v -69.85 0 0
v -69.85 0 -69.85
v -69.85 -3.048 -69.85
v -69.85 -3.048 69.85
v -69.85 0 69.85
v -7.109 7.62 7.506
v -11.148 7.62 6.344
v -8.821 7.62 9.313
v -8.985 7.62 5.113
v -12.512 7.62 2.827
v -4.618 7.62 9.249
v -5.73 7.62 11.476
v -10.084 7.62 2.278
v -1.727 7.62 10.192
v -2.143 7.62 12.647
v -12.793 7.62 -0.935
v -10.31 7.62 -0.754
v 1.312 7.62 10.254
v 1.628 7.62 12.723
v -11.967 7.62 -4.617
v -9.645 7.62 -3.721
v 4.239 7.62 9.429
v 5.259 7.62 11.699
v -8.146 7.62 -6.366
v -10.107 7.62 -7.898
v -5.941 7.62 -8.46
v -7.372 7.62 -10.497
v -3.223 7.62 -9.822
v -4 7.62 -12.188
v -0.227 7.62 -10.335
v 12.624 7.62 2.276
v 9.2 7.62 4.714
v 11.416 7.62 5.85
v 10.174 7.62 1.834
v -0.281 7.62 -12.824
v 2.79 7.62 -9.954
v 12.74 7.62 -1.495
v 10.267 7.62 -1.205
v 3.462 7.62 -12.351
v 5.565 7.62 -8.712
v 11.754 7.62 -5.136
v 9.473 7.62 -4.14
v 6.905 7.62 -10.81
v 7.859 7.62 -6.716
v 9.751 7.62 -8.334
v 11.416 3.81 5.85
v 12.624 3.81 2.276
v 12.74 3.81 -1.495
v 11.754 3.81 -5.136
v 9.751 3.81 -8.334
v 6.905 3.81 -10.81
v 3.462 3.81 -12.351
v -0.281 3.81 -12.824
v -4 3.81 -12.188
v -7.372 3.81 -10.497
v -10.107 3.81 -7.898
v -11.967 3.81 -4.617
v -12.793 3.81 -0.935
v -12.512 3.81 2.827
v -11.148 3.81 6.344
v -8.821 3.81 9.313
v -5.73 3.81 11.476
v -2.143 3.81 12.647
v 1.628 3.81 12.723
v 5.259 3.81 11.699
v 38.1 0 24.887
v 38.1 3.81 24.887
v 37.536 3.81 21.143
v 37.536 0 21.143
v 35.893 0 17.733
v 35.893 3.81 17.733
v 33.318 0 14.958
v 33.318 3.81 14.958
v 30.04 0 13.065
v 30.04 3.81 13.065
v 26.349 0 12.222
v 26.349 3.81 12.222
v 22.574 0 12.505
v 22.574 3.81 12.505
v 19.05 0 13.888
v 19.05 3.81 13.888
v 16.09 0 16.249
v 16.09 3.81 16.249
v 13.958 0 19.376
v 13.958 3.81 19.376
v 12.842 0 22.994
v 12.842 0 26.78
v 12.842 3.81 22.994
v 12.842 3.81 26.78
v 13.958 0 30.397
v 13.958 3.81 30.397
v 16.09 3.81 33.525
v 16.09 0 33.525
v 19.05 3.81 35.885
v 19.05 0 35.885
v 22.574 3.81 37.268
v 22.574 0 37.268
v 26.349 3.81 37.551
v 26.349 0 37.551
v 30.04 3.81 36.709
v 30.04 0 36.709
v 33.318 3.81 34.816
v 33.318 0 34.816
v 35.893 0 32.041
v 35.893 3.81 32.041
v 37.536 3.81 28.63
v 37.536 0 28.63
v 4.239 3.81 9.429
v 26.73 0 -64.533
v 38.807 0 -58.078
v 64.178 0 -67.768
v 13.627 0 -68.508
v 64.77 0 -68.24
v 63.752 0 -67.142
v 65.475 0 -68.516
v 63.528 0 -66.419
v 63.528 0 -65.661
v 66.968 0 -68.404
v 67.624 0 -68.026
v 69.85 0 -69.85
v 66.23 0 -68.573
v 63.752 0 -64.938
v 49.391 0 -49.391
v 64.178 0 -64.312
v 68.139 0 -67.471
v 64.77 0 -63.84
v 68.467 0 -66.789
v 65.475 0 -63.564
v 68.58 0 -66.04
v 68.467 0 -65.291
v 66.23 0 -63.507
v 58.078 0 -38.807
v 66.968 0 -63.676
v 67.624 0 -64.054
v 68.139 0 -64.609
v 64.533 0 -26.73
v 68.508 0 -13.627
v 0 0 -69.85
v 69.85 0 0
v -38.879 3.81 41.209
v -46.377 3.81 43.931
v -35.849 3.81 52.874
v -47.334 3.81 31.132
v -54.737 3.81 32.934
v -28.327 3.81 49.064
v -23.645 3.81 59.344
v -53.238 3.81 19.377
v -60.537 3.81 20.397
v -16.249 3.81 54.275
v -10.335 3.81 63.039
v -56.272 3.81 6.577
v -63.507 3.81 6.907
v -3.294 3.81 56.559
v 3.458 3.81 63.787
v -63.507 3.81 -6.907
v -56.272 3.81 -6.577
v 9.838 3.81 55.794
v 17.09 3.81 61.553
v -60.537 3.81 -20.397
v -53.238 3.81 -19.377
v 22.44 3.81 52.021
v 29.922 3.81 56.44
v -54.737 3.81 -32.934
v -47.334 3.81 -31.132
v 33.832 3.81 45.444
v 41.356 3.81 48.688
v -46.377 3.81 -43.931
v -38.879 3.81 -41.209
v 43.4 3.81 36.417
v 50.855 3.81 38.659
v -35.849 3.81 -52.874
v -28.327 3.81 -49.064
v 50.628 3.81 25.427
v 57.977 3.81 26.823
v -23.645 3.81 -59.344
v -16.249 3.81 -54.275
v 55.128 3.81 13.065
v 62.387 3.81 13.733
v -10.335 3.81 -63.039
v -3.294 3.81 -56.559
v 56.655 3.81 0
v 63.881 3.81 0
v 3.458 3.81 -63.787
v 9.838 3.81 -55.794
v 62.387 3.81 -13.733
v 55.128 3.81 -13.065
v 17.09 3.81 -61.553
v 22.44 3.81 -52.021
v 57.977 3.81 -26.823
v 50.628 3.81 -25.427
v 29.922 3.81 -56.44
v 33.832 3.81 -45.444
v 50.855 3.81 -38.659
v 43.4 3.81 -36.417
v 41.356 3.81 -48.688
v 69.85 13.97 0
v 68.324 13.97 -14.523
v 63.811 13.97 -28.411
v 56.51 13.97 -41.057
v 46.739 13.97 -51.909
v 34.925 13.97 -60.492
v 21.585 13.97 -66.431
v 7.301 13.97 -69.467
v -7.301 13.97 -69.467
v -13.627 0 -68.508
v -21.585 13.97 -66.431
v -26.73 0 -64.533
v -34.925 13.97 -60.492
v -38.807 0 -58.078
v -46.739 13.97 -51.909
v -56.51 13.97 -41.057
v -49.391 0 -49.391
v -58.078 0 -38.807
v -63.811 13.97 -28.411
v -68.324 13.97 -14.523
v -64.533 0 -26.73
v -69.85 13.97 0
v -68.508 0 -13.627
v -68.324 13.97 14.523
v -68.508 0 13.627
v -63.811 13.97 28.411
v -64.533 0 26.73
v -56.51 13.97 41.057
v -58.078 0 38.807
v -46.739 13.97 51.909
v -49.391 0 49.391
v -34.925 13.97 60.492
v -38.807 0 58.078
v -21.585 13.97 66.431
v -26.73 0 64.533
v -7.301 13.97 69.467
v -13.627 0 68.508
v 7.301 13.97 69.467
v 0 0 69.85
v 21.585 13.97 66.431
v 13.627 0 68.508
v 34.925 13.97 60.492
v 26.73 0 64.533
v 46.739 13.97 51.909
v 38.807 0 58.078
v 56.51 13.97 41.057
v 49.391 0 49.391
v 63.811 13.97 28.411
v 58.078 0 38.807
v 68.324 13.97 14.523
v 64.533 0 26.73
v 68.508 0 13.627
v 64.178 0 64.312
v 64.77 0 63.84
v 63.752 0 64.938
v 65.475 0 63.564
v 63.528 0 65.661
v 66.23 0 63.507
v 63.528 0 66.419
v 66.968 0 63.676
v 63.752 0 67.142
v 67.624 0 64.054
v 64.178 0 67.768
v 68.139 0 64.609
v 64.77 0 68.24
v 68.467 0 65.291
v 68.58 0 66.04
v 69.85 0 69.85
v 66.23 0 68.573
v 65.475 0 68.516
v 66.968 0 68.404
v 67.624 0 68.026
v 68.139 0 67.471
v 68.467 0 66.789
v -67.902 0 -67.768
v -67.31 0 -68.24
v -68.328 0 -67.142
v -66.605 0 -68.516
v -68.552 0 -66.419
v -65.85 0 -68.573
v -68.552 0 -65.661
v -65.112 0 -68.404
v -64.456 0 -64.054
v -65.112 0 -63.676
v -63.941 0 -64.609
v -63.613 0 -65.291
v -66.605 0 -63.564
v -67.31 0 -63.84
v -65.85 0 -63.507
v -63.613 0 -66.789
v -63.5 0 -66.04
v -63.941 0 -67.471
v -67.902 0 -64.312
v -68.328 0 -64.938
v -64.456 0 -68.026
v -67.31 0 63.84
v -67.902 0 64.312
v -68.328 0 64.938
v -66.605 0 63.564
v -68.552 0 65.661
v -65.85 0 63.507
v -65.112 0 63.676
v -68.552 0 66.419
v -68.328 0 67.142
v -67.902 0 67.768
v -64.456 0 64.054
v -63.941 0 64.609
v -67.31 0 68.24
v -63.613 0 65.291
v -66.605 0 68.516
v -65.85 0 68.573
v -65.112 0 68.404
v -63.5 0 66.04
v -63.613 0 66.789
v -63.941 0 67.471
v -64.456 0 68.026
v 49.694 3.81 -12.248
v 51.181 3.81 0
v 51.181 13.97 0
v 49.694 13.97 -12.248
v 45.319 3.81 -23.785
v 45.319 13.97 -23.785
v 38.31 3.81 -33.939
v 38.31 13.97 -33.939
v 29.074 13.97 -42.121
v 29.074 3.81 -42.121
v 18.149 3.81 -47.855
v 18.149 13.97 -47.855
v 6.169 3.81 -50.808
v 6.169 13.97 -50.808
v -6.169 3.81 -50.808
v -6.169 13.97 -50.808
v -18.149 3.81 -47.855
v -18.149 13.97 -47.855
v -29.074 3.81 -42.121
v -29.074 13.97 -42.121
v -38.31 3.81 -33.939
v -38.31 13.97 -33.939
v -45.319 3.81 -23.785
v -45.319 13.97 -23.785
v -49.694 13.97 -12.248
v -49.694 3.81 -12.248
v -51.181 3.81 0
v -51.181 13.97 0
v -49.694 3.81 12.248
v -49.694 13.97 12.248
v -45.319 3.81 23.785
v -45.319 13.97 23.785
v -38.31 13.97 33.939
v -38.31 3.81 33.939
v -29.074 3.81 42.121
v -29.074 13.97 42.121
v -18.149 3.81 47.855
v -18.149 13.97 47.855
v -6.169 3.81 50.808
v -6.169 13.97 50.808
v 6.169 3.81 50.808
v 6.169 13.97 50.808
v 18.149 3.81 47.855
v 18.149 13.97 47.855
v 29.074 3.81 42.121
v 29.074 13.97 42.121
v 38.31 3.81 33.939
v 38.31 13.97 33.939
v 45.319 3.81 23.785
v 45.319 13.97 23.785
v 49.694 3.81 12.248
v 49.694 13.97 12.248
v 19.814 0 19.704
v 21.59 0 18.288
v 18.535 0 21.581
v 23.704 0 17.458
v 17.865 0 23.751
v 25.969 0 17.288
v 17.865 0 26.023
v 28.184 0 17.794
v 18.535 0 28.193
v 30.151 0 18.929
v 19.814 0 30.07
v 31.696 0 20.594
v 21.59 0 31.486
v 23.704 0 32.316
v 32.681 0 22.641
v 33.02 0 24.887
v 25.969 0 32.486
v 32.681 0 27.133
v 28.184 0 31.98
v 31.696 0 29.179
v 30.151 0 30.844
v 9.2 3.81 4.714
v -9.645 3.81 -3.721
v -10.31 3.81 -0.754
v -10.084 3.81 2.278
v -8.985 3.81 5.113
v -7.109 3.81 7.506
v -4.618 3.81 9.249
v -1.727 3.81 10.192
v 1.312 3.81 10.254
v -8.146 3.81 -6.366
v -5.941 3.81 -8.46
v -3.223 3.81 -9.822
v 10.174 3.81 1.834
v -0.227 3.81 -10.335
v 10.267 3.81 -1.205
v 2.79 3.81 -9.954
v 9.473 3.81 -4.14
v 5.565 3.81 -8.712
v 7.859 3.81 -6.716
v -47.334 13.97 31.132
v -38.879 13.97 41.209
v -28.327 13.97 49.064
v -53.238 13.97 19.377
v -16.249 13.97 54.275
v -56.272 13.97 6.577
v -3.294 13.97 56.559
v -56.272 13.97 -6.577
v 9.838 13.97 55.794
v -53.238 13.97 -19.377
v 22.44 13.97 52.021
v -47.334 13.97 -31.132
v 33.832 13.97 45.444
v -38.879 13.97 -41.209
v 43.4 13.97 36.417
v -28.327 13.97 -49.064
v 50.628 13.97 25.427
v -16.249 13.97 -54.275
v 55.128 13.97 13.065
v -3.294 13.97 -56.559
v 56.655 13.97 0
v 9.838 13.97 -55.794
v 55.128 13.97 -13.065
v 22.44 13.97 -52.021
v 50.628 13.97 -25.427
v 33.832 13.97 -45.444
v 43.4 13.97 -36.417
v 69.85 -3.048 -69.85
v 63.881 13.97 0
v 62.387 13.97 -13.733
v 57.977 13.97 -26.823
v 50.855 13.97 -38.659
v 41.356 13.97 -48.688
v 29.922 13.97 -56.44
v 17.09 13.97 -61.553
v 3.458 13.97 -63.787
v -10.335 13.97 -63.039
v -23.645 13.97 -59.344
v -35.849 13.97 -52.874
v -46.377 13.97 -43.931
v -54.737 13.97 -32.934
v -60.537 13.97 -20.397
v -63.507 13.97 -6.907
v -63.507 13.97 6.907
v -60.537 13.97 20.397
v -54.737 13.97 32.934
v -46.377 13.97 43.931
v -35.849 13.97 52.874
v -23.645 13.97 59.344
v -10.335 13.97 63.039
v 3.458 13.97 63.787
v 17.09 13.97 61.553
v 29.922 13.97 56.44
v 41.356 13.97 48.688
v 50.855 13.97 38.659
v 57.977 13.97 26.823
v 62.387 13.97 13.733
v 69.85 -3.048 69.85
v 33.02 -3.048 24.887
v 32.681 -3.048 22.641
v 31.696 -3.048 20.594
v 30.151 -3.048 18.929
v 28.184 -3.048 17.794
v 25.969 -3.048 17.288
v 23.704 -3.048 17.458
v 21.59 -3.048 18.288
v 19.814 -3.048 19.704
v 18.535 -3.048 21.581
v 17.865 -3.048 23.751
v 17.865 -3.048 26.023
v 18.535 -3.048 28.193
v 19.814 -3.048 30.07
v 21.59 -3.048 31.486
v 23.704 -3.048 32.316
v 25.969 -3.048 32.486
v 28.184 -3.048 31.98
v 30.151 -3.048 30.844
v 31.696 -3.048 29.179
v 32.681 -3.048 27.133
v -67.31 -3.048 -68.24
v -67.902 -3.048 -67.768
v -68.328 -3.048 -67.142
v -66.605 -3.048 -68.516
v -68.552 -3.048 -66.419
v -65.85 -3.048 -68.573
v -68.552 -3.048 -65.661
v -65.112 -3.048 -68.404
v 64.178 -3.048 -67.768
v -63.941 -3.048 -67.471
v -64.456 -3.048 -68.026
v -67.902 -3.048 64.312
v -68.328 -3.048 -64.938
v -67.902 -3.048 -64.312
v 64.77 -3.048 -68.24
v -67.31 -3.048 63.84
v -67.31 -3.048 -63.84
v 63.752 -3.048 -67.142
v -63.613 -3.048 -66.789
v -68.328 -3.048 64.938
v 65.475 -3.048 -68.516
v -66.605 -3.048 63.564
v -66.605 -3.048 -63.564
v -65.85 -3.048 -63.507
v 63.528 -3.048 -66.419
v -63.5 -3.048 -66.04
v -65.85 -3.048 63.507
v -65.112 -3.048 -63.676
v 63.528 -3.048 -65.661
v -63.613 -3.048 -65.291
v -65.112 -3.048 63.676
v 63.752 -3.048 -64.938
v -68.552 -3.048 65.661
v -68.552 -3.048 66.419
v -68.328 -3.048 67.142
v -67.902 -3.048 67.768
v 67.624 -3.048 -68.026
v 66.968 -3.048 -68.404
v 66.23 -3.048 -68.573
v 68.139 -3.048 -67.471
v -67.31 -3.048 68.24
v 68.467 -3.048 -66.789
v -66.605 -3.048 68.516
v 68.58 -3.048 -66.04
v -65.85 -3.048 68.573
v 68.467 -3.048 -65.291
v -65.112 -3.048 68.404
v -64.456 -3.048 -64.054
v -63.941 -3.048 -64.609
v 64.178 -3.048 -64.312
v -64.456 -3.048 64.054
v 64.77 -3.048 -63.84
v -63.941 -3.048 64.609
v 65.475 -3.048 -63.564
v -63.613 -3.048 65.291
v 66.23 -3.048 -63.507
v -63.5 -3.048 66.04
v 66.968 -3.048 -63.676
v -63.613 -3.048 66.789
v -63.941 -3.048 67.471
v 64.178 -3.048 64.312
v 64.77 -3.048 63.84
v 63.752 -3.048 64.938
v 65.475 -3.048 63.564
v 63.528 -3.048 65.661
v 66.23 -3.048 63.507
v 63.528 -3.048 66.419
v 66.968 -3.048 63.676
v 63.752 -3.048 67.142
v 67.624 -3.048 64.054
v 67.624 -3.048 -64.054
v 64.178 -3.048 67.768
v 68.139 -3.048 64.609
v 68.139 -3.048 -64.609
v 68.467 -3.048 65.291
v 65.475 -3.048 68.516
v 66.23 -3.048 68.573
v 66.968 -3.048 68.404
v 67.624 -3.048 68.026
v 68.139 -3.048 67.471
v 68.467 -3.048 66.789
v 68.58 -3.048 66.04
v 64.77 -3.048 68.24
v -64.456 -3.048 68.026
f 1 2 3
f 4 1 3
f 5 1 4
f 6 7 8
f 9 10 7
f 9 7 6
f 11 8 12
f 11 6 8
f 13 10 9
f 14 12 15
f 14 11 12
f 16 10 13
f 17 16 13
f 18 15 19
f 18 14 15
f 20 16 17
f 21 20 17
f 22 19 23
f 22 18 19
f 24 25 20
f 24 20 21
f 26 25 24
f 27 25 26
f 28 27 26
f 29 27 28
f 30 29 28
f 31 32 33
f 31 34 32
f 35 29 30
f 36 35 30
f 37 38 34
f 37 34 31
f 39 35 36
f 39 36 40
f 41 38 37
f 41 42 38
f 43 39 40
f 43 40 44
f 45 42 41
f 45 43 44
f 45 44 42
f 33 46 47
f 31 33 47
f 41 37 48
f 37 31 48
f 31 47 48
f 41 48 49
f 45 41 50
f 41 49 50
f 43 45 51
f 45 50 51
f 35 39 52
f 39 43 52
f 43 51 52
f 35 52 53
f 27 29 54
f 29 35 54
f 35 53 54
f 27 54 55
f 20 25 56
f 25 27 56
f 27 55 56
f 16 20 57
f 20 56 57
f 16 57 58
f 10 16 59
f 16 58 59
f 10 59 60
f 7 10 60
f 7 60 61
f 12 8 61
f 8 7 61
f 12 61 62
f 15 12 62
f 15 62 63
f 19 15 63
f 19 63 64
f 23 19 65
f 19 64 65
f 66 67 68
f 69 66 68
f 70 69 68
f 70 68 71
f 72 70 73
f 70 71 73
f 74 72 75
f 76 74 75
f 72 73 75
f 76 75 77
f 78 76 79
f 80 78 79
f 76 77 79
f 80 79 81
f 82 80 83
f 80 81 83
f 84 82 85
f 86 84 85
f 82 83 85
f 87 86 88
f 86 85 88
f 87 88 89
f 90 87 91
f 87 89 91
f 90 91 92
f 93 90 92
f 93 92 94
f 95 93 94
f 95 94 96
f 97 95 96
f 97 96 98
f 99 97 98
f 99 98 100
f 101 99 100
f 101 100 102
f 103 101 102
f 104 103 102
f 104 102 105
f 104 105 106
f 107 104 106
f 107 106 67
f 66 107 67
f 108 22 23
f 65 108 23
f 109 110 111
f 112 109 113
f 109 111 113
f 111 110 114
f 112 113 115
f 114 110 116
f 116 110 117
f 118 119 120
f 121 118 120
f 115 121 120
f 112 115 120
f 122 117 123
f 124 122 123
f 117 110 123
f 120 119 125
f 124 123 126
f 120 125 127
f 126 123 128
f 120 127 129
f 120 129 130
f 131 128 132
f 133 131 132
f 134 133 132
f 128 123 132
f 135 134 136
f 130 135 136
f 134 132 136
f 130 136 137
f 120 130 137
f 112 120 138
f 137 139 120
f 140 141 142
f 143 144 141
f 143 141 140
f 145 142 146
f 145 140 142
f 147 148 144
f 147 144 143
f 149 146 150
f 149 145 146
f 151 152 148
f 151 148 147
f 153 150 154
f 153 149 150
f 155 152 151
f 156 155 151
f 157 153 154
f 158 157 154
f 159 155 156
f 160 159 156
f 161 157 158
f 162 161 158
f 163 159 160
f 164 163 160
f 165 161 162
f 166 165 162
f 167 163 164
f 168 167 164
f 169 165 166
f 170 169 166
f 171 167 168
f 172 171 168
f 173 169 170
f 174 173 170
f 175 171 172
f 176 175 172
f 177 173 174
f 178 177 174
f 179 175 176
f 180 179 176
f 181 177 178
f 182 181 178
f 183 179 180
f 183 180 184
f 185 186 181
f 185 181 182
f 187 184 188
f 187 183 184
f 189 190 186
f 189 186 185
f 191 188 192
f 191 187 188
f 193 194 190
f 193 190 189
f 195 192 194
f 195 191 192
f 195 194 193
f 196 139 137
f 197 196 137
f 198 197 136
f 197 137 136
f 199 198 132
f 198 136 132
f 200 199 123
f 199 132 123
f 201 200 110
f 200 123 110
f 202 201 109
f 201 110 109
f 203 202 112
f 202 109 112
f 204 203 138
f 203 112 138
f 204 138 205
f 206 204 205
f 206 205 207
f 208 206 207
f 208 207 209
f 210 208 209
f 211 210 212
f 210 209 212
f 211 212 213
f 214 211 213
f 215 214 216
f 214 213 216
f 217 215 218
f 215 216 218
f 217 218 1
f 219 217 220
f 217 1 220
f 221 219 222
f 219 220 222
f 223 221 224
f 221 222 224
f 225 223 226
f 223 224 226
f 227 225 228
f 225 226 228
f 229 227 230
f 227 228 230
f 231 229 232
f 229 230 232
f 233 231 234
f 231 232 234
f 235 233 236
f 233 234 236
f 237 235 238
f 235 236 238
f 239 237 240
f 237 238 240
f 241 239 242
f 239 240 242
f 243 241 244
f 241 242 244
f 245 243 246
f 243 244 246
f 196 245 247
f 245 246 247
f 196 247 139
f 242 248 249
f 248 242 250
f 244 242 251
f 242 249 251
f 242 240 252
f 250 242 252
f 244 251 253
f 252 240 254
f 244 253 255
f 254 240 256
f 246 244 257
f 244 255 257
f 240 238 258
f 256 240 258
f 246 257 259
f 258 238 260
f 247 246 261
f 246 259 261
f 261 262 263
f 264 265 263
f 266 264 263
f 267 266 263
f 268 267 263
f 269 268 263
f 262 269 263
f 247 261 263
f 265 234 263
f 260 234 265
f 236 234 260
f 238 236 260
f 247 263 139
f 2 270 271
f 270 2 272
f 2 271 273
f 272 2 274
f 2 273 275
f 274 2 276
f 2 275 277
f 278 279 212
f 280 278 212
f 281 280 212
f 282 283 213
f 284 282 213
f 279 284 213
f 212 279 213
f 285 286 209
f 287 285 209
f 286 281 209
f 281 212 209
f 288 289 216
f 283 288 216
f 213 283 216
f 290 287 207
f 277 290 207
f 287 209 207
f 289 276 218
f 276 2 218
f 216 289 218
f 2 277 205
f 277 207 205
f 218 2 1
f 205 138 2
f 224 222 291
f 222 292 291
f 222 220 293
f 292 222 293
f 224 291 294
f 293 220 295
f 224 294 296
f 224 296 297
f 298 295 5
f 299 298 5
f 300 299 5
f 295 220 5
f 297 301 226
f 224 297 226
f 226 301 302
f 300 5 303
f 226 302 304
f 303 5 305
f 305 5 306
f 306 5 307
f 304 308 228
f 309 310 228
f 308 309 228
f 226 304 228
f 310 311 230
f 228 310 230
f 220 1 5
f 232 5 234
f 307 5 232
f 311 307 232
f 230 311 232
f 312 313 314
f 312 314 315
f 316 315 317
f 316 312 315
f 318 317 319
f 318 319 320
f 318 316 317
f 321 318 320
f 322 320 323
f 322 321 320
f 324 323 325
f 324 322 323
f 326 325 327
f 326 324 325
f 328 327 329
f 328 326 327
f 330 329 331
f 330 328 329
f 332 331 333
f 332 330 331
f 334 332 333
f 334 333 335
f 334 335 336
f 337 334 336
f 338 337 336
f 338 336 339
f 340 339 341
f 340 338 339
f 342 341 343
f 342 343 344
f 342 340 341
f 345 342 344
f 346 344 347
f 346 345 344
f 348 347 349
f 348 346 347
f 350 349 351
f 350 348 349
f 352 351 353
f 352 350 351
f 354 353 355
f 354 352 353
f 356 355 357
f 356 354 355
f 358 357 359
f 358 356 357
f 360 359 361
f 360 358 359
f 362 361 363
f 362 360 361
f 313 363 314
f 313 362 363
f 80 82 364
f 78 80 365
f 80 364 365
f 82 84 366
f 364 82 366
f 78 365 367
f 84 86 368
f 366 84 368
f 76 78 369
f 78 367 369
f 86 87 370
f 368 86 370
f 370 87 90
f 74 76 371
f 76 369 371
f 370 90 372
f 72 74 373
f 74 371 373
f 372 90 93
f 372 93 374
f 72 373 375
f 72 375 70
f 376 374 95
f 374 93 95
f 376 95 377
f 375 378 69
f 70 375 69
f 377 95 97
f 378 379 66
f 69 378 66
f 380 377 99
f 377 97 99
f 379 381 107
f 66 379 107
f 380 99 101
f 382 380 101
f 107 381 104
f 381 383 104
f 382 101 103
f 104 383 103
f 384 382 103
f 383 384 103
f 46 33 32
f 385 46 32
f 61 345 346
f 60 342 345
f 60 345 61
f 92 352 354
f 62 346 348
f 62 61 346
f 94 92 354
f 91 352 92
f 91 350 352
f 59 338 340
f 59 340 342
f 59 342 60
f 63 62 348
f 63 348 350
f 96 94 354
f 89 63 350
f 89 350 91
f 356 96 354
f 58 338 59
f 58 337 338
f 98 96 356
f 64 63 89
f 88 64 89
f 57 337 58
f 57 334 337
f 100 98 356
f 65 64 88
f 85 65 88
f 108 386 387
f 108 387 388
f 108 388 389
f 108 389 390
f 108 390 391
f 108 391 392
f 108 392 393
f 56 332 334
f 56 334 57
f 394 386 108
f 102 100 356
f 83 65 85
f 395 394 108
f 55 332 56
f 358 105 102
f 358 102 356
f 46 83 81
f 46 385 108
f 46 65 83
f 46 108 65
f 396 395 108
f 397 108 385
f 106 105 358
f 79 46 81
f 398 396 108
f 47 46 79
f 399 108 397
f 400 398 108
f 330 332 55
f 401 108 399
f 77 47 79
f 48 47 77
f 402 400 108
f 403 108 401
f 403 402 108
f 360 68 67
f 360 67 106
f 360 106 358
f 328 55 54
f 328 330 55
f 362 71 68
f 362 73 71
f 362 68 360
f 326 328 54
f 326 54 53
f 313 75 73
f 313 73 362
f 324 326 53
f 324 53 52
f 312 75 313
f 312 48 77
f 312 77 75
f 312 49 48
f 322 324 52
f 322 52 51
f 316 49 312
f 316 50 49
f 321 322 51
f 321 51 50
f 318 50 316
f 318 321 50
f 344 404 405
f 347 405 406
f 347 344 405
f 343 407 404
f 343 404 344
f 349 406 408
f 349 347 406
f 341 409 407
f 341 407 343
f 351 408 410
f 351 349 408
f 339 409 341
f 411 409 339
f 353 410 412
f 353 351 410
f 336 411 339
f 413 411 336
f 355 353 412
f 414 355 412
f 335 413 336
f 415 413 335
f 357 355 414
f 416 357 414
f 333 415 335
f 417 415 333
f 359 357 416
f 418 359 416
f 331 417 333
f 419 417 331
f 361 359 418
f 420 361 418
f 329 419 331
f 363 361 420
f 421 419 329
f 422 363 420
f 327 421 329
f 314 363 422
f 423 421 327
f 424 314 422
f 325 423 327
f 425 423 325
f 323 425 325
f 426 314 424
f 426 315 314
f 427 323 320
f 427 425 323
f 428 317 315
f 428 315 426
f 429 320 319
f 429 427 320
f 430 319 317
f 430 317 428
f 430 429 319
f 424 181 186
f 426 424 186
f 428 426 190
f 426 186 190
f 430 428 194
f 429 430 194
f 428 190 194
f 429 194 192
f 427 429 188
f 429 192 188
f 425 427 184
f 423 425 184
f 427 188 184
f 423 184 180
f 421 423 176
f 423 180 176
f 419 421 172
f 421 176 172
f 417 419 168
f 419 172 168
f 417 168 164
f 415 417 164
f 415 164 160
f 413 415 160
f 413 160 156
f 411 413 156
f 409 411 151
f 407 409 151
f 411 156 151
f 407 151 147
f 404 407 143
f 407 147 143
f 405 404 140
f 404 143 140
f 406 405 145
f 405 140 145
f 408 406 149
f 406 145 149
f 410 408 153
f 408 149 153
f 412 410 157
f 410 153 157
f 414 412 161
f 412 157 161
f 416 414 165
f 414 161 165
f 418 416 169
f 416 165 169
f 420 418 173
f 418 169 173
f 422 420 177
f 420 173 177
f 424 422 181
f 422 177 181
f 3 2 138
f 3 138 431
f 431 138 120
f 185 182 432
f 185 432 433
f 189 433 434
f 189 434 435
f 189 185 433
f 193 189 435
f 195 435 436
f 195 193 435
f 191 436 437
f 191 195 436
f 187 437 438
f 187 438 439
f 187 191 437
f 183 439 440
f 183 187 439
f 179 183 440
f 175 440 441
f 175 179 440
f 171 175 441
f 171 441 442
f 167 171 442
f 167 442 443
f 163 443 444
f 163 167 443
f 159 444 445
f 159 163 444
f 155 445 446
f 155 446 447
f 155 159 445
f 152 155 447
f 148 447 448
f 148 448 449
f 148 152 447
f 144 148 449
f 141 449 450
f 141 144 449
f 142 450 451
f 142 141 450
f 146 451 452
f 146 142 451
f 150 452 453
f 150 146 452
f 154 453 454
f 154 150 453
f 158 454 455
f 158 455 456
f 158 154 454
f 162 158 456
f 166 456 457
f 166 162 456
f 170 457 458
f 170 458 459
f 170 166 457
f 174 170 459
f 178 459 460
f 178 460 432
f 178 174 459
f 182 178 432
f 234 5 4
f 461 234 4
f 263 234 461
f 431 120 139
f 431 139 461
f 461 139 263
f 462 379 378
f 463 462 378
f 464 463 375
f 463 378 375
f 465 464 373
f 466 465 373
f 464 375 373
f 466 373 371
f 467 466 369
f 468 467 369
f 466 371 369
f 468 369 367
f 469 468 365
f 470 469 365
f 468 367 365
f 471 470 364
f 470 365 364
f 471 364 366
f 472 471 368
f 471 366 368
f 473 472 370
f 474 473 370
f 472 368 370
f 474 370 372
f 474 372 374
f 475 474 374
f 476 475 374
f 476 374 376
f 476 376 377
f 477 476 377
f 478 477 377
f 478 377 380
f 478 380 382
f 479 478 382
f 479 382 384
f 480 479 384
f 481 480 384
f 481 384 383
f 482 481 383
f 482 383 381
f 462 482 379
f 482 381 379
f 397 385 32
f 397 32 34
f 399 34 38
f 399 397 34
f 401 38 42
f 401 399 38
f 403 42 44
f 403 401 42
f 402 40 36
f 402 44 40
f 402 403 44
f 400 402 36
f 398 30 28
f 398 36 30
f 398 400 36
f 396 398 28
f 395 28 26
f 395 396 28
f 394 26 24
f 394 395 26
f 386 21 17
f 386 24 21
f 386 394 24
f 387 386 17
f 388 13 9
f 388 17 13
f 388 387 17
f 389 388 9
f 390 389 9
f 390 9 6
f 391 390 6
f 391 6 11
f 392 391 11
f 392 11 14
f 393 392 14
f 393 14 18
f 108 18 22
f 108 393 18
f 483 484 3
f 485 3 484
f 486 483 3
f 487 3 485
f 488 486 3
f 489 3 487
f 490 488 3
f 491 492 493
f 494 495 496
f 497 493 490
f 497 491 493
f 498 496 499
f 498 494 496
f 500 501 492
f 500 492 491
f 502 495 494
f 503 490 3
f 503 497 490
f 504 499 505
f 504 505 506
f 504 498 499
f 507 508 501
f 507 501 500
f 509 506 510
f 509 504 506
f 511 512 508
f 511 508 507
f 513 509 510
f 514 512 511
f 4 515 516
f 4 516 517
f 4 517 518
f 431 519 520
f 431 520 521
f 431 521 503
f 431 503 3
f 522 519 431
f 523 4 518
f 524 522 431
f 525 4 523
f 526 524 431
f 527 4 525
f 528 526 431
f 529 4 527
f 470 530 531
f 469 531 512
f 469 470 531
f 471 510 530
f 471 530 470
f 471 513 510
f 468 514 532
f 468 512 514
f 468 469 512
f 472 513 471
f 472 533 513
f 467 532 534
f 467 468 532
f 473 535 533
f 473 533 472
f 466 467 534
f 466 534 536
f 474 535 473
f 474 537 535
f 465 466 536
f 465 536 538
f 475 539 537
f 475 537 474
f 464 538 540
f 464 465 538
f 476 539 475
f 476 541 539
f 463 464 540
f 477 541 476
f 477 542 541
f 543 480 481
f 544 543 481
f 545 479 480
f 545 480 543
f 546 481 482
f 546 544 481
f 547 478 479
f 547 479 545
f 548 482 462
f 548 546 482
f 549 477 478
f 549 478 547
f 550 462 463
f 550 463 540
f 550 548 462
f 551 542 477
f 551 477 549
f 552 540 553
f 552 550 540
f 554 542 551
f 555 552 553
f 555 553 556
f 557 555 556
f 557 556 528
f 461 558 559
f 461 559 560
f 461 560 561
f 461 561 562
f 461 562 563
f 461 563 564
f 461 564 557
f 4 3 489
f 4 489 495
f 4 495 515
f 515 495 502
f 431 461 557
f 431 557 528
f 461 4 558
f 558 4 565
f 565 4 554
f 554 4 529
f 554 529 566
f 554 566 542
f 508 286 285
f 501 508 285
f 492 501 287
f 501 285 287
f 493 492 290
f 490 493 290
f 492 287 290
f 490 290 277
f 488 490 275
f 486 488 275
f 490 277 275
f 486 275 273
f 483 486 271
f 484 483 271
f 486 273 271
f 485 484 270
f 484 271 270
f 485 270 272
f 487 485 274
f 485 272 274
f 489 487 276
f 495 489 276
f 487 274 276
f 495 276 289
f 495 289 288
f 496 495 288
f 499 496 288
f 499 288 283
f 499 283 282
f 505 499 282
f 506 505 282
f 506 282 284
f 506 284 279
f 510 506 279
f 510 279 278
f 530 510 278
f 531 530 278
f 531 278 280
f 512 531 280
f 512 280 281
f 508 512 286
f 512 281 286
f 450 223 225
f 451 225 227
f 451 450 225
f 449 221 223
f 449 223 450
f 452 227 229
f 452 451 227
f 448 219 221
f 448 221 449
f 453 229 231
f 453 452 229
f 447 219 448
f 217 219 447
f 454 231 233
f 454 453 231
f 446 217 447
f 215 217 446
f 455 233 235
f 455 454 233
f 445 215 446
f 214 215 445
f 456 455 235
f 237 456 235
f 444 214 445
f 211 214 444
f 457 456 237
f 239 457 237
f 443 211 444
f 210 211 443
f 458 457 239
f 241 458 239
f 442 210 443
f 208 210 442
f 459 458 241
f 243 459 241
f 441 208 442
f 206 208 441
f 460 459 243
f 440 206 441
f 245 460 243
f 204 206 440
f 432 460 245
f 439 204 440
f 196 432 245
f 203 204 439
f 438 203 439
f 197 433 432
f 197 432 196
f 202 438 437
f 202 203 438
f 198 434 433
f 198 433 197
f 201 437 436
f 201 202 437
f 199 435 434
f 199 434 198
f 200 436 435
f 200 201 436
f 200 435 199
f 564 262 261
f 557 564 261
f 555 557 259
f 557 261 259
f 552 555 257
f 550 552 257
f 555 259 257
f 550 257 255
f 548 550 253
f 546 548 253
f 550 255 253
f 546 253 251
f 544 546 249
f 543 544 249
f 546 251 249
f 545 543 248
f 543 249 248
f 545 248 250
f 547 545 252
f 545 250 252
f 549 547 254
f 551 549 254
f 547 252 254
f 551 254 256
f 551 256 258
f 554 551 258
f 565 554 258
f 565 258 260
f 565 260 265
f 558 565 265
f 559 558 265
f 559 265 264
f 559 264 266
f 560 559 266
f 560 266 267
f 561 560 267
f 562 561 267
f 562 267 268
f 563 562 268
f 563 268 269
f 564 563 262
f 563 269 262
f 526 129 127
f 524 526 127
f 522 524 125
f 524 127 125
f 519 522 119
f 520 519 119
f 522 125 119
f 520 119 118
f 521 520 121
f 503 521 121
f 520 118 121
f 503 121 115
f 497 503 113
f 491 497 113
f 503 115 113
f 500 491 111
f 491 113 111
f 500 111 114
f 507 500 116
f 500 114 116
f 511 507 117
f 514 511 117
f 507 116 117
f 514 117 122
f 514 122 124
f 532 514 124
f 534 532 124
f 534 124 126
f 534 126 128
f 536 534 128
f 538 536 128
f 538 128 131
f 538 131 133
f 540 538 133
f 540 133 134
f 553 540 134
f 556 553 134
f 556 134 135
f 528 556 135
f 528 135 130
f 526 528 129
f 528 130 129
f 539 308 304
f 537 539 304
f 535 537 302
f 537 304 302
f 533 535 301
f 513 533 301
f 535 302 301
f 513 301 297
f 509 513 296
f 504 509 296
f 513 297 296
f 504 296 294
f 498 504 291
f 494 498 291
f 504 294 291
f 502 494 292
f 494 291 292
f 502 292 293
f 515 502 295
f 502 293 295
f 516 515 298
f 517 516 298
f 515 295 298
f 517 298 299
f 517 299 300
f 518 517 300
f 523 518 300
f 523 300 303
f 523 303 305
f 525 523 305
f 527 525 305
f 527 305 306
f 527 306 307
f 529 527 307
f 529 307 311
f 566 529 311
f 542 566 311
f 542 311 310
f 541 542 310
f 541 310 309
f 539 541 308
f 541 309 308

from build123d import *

# Parameters (mm, degrees)
SKETCH1_R           = 69.85
BOSS_EXTRUDE1_DEPTH = 3.81
SKETCH2_R           = 69.85
SKETCH2_R_2         = 63.881
SKETCH2_R_3         = 56.6547
SKETCH2_R_4         = 51.181
BOSS_EXTRUDE2_DEPTH = 10.16
SKETCH3_R           = 12.827
SKETCH3_R_2         = 10.3378
BOSS_EXTRUDE3_DEPTH = 3.81
CUT_EXTRUDE1_DEPTH  = 3.81
SKETCH5_R           = 12.7
CUT_EXTRUDE2_DEPTH  = 10.16
SKETCH6_W           = 139.7
SKETCH6_H           = 139.7
BOSS_EXTRUDE4_DEPTH = 3.048
SKETCH7_R           = 7.62
SKETCH7_R_2         = 2.54
CUT_EXTRUDE3_DEPTH  = 3.048


with BuildPart() as part:
    # Sketch1 → Boss-Extrude1 (new body)
    with BuildSketch(Plane(origin=(0, 0, 0), x_dir=(1, 0, 0), z_dir=(0, 1, 0))):
        Circle(SKETCH1_R)
    extrude(amount=BOSS_EXTRUDE1_DEPTH)

    # Sketch2 → Boss-Extrude2 (add)
    with BuildSketch(Plane(origin=(0, 3.81, 0), x_dir=(1, 0, 0), z_dir=(0, 1, 0))):
        Circle(SKETCH2_R)
        Circle(SKETCH2_R_2, mode=Mode.SUBTRACT)
        Circle(SKETCH2_R_3)
        Circle(SKETCH2_R_4, mode=Mode.SUBTRACT)
    extrude(amount=BOSS_EXTRUDE2_DEPTH)

    # Sketch3 → Boss-Extrude3 (add)
    with BuildSketch(Plane(origin=(0, 3.81, 0), x_dir=(1, 0, 0), z_dir=(0, 1, 0))):
        Circle(SKETCH3_R)
        Circle(SKETCH3_R_2, mode=Mode.SUBTRACT)
    extrude(amount=BOSS_EXTRUDE3_DEPTH)

    # Sketch4 → Cut-Extrude1 (cut)
    with BuildSketch(Plane(origin=(0, 7.62, 0), x_dir=(1, 0, 0), z_dir=(0, 1, 0))):
        with BuildLine():
            Line((4.238603881, -9.428910116), (5.259201376, -11.699261938))
            ThreePointArc((5.259201376, -11.699261938), (8.835496643, -9.29870572), (11.415504655, -5.849630969))
            Line((11.415504655, -5.849630969), (9.200218603, -4.714455058))
            ThreePointArc((9.200218603, -4.714455058), (7.120885413, -7.494204412), (4.238603881, -9.428910116))
        make_face()
    extrude(amount=-CUT_EXTRUDE1_DEPTH, mode=Mode.SUBTRACT)

    # Sketch5 → Cut-Extrude2 (cut)
    with BuildSketch(Plane(origin=(0, 3.81, 0), x_dir=(1, 0, 0), z_dir=(0, 1, 0))):
        with Locations((25.4, -24.886815787)):
            Circle(SKETCH5_R)
    extrude(amount=-CUT_EXTRUDE2_DEPTH, mode=Mode.SUBTRACT)

    # Sketch6 → Boss-Extrude4 (add)
    with BuildSketch(Plane.XZ):
        Rectangle(SKETCH6_W, SKETCH6_H)
    extrude(amount=BOSS_EXTRUDE4_DEPTH)

    # Sketch7 → Cut-Extrude3 (cut)
    with BuildSketch(Plane(origin=(0, 0, 0), x_dir=(1, 0, 0), z_dir=(0, 1, 0))):
        with Locations((25.4, -24.886815787)):
            Circle(SKETCH7_R)
        with Locations((-66.04, -66.04)):
            Circle(SKETCH7_R_2)
        with Locations((66.04, -66.04)):
            Circle(SKETCH7_R_2)
        with Locations((66.04, 66.04)):
            Circle(SKETCH7_R_2)
        with Locations((-66.04, 66.04)):
            Circle(SKETCH7_R_2)
    extrude(amount=-CUT_EXTRUDE3_DEPTH, mode=Mode.SUBTRACT)


solid = part.part
